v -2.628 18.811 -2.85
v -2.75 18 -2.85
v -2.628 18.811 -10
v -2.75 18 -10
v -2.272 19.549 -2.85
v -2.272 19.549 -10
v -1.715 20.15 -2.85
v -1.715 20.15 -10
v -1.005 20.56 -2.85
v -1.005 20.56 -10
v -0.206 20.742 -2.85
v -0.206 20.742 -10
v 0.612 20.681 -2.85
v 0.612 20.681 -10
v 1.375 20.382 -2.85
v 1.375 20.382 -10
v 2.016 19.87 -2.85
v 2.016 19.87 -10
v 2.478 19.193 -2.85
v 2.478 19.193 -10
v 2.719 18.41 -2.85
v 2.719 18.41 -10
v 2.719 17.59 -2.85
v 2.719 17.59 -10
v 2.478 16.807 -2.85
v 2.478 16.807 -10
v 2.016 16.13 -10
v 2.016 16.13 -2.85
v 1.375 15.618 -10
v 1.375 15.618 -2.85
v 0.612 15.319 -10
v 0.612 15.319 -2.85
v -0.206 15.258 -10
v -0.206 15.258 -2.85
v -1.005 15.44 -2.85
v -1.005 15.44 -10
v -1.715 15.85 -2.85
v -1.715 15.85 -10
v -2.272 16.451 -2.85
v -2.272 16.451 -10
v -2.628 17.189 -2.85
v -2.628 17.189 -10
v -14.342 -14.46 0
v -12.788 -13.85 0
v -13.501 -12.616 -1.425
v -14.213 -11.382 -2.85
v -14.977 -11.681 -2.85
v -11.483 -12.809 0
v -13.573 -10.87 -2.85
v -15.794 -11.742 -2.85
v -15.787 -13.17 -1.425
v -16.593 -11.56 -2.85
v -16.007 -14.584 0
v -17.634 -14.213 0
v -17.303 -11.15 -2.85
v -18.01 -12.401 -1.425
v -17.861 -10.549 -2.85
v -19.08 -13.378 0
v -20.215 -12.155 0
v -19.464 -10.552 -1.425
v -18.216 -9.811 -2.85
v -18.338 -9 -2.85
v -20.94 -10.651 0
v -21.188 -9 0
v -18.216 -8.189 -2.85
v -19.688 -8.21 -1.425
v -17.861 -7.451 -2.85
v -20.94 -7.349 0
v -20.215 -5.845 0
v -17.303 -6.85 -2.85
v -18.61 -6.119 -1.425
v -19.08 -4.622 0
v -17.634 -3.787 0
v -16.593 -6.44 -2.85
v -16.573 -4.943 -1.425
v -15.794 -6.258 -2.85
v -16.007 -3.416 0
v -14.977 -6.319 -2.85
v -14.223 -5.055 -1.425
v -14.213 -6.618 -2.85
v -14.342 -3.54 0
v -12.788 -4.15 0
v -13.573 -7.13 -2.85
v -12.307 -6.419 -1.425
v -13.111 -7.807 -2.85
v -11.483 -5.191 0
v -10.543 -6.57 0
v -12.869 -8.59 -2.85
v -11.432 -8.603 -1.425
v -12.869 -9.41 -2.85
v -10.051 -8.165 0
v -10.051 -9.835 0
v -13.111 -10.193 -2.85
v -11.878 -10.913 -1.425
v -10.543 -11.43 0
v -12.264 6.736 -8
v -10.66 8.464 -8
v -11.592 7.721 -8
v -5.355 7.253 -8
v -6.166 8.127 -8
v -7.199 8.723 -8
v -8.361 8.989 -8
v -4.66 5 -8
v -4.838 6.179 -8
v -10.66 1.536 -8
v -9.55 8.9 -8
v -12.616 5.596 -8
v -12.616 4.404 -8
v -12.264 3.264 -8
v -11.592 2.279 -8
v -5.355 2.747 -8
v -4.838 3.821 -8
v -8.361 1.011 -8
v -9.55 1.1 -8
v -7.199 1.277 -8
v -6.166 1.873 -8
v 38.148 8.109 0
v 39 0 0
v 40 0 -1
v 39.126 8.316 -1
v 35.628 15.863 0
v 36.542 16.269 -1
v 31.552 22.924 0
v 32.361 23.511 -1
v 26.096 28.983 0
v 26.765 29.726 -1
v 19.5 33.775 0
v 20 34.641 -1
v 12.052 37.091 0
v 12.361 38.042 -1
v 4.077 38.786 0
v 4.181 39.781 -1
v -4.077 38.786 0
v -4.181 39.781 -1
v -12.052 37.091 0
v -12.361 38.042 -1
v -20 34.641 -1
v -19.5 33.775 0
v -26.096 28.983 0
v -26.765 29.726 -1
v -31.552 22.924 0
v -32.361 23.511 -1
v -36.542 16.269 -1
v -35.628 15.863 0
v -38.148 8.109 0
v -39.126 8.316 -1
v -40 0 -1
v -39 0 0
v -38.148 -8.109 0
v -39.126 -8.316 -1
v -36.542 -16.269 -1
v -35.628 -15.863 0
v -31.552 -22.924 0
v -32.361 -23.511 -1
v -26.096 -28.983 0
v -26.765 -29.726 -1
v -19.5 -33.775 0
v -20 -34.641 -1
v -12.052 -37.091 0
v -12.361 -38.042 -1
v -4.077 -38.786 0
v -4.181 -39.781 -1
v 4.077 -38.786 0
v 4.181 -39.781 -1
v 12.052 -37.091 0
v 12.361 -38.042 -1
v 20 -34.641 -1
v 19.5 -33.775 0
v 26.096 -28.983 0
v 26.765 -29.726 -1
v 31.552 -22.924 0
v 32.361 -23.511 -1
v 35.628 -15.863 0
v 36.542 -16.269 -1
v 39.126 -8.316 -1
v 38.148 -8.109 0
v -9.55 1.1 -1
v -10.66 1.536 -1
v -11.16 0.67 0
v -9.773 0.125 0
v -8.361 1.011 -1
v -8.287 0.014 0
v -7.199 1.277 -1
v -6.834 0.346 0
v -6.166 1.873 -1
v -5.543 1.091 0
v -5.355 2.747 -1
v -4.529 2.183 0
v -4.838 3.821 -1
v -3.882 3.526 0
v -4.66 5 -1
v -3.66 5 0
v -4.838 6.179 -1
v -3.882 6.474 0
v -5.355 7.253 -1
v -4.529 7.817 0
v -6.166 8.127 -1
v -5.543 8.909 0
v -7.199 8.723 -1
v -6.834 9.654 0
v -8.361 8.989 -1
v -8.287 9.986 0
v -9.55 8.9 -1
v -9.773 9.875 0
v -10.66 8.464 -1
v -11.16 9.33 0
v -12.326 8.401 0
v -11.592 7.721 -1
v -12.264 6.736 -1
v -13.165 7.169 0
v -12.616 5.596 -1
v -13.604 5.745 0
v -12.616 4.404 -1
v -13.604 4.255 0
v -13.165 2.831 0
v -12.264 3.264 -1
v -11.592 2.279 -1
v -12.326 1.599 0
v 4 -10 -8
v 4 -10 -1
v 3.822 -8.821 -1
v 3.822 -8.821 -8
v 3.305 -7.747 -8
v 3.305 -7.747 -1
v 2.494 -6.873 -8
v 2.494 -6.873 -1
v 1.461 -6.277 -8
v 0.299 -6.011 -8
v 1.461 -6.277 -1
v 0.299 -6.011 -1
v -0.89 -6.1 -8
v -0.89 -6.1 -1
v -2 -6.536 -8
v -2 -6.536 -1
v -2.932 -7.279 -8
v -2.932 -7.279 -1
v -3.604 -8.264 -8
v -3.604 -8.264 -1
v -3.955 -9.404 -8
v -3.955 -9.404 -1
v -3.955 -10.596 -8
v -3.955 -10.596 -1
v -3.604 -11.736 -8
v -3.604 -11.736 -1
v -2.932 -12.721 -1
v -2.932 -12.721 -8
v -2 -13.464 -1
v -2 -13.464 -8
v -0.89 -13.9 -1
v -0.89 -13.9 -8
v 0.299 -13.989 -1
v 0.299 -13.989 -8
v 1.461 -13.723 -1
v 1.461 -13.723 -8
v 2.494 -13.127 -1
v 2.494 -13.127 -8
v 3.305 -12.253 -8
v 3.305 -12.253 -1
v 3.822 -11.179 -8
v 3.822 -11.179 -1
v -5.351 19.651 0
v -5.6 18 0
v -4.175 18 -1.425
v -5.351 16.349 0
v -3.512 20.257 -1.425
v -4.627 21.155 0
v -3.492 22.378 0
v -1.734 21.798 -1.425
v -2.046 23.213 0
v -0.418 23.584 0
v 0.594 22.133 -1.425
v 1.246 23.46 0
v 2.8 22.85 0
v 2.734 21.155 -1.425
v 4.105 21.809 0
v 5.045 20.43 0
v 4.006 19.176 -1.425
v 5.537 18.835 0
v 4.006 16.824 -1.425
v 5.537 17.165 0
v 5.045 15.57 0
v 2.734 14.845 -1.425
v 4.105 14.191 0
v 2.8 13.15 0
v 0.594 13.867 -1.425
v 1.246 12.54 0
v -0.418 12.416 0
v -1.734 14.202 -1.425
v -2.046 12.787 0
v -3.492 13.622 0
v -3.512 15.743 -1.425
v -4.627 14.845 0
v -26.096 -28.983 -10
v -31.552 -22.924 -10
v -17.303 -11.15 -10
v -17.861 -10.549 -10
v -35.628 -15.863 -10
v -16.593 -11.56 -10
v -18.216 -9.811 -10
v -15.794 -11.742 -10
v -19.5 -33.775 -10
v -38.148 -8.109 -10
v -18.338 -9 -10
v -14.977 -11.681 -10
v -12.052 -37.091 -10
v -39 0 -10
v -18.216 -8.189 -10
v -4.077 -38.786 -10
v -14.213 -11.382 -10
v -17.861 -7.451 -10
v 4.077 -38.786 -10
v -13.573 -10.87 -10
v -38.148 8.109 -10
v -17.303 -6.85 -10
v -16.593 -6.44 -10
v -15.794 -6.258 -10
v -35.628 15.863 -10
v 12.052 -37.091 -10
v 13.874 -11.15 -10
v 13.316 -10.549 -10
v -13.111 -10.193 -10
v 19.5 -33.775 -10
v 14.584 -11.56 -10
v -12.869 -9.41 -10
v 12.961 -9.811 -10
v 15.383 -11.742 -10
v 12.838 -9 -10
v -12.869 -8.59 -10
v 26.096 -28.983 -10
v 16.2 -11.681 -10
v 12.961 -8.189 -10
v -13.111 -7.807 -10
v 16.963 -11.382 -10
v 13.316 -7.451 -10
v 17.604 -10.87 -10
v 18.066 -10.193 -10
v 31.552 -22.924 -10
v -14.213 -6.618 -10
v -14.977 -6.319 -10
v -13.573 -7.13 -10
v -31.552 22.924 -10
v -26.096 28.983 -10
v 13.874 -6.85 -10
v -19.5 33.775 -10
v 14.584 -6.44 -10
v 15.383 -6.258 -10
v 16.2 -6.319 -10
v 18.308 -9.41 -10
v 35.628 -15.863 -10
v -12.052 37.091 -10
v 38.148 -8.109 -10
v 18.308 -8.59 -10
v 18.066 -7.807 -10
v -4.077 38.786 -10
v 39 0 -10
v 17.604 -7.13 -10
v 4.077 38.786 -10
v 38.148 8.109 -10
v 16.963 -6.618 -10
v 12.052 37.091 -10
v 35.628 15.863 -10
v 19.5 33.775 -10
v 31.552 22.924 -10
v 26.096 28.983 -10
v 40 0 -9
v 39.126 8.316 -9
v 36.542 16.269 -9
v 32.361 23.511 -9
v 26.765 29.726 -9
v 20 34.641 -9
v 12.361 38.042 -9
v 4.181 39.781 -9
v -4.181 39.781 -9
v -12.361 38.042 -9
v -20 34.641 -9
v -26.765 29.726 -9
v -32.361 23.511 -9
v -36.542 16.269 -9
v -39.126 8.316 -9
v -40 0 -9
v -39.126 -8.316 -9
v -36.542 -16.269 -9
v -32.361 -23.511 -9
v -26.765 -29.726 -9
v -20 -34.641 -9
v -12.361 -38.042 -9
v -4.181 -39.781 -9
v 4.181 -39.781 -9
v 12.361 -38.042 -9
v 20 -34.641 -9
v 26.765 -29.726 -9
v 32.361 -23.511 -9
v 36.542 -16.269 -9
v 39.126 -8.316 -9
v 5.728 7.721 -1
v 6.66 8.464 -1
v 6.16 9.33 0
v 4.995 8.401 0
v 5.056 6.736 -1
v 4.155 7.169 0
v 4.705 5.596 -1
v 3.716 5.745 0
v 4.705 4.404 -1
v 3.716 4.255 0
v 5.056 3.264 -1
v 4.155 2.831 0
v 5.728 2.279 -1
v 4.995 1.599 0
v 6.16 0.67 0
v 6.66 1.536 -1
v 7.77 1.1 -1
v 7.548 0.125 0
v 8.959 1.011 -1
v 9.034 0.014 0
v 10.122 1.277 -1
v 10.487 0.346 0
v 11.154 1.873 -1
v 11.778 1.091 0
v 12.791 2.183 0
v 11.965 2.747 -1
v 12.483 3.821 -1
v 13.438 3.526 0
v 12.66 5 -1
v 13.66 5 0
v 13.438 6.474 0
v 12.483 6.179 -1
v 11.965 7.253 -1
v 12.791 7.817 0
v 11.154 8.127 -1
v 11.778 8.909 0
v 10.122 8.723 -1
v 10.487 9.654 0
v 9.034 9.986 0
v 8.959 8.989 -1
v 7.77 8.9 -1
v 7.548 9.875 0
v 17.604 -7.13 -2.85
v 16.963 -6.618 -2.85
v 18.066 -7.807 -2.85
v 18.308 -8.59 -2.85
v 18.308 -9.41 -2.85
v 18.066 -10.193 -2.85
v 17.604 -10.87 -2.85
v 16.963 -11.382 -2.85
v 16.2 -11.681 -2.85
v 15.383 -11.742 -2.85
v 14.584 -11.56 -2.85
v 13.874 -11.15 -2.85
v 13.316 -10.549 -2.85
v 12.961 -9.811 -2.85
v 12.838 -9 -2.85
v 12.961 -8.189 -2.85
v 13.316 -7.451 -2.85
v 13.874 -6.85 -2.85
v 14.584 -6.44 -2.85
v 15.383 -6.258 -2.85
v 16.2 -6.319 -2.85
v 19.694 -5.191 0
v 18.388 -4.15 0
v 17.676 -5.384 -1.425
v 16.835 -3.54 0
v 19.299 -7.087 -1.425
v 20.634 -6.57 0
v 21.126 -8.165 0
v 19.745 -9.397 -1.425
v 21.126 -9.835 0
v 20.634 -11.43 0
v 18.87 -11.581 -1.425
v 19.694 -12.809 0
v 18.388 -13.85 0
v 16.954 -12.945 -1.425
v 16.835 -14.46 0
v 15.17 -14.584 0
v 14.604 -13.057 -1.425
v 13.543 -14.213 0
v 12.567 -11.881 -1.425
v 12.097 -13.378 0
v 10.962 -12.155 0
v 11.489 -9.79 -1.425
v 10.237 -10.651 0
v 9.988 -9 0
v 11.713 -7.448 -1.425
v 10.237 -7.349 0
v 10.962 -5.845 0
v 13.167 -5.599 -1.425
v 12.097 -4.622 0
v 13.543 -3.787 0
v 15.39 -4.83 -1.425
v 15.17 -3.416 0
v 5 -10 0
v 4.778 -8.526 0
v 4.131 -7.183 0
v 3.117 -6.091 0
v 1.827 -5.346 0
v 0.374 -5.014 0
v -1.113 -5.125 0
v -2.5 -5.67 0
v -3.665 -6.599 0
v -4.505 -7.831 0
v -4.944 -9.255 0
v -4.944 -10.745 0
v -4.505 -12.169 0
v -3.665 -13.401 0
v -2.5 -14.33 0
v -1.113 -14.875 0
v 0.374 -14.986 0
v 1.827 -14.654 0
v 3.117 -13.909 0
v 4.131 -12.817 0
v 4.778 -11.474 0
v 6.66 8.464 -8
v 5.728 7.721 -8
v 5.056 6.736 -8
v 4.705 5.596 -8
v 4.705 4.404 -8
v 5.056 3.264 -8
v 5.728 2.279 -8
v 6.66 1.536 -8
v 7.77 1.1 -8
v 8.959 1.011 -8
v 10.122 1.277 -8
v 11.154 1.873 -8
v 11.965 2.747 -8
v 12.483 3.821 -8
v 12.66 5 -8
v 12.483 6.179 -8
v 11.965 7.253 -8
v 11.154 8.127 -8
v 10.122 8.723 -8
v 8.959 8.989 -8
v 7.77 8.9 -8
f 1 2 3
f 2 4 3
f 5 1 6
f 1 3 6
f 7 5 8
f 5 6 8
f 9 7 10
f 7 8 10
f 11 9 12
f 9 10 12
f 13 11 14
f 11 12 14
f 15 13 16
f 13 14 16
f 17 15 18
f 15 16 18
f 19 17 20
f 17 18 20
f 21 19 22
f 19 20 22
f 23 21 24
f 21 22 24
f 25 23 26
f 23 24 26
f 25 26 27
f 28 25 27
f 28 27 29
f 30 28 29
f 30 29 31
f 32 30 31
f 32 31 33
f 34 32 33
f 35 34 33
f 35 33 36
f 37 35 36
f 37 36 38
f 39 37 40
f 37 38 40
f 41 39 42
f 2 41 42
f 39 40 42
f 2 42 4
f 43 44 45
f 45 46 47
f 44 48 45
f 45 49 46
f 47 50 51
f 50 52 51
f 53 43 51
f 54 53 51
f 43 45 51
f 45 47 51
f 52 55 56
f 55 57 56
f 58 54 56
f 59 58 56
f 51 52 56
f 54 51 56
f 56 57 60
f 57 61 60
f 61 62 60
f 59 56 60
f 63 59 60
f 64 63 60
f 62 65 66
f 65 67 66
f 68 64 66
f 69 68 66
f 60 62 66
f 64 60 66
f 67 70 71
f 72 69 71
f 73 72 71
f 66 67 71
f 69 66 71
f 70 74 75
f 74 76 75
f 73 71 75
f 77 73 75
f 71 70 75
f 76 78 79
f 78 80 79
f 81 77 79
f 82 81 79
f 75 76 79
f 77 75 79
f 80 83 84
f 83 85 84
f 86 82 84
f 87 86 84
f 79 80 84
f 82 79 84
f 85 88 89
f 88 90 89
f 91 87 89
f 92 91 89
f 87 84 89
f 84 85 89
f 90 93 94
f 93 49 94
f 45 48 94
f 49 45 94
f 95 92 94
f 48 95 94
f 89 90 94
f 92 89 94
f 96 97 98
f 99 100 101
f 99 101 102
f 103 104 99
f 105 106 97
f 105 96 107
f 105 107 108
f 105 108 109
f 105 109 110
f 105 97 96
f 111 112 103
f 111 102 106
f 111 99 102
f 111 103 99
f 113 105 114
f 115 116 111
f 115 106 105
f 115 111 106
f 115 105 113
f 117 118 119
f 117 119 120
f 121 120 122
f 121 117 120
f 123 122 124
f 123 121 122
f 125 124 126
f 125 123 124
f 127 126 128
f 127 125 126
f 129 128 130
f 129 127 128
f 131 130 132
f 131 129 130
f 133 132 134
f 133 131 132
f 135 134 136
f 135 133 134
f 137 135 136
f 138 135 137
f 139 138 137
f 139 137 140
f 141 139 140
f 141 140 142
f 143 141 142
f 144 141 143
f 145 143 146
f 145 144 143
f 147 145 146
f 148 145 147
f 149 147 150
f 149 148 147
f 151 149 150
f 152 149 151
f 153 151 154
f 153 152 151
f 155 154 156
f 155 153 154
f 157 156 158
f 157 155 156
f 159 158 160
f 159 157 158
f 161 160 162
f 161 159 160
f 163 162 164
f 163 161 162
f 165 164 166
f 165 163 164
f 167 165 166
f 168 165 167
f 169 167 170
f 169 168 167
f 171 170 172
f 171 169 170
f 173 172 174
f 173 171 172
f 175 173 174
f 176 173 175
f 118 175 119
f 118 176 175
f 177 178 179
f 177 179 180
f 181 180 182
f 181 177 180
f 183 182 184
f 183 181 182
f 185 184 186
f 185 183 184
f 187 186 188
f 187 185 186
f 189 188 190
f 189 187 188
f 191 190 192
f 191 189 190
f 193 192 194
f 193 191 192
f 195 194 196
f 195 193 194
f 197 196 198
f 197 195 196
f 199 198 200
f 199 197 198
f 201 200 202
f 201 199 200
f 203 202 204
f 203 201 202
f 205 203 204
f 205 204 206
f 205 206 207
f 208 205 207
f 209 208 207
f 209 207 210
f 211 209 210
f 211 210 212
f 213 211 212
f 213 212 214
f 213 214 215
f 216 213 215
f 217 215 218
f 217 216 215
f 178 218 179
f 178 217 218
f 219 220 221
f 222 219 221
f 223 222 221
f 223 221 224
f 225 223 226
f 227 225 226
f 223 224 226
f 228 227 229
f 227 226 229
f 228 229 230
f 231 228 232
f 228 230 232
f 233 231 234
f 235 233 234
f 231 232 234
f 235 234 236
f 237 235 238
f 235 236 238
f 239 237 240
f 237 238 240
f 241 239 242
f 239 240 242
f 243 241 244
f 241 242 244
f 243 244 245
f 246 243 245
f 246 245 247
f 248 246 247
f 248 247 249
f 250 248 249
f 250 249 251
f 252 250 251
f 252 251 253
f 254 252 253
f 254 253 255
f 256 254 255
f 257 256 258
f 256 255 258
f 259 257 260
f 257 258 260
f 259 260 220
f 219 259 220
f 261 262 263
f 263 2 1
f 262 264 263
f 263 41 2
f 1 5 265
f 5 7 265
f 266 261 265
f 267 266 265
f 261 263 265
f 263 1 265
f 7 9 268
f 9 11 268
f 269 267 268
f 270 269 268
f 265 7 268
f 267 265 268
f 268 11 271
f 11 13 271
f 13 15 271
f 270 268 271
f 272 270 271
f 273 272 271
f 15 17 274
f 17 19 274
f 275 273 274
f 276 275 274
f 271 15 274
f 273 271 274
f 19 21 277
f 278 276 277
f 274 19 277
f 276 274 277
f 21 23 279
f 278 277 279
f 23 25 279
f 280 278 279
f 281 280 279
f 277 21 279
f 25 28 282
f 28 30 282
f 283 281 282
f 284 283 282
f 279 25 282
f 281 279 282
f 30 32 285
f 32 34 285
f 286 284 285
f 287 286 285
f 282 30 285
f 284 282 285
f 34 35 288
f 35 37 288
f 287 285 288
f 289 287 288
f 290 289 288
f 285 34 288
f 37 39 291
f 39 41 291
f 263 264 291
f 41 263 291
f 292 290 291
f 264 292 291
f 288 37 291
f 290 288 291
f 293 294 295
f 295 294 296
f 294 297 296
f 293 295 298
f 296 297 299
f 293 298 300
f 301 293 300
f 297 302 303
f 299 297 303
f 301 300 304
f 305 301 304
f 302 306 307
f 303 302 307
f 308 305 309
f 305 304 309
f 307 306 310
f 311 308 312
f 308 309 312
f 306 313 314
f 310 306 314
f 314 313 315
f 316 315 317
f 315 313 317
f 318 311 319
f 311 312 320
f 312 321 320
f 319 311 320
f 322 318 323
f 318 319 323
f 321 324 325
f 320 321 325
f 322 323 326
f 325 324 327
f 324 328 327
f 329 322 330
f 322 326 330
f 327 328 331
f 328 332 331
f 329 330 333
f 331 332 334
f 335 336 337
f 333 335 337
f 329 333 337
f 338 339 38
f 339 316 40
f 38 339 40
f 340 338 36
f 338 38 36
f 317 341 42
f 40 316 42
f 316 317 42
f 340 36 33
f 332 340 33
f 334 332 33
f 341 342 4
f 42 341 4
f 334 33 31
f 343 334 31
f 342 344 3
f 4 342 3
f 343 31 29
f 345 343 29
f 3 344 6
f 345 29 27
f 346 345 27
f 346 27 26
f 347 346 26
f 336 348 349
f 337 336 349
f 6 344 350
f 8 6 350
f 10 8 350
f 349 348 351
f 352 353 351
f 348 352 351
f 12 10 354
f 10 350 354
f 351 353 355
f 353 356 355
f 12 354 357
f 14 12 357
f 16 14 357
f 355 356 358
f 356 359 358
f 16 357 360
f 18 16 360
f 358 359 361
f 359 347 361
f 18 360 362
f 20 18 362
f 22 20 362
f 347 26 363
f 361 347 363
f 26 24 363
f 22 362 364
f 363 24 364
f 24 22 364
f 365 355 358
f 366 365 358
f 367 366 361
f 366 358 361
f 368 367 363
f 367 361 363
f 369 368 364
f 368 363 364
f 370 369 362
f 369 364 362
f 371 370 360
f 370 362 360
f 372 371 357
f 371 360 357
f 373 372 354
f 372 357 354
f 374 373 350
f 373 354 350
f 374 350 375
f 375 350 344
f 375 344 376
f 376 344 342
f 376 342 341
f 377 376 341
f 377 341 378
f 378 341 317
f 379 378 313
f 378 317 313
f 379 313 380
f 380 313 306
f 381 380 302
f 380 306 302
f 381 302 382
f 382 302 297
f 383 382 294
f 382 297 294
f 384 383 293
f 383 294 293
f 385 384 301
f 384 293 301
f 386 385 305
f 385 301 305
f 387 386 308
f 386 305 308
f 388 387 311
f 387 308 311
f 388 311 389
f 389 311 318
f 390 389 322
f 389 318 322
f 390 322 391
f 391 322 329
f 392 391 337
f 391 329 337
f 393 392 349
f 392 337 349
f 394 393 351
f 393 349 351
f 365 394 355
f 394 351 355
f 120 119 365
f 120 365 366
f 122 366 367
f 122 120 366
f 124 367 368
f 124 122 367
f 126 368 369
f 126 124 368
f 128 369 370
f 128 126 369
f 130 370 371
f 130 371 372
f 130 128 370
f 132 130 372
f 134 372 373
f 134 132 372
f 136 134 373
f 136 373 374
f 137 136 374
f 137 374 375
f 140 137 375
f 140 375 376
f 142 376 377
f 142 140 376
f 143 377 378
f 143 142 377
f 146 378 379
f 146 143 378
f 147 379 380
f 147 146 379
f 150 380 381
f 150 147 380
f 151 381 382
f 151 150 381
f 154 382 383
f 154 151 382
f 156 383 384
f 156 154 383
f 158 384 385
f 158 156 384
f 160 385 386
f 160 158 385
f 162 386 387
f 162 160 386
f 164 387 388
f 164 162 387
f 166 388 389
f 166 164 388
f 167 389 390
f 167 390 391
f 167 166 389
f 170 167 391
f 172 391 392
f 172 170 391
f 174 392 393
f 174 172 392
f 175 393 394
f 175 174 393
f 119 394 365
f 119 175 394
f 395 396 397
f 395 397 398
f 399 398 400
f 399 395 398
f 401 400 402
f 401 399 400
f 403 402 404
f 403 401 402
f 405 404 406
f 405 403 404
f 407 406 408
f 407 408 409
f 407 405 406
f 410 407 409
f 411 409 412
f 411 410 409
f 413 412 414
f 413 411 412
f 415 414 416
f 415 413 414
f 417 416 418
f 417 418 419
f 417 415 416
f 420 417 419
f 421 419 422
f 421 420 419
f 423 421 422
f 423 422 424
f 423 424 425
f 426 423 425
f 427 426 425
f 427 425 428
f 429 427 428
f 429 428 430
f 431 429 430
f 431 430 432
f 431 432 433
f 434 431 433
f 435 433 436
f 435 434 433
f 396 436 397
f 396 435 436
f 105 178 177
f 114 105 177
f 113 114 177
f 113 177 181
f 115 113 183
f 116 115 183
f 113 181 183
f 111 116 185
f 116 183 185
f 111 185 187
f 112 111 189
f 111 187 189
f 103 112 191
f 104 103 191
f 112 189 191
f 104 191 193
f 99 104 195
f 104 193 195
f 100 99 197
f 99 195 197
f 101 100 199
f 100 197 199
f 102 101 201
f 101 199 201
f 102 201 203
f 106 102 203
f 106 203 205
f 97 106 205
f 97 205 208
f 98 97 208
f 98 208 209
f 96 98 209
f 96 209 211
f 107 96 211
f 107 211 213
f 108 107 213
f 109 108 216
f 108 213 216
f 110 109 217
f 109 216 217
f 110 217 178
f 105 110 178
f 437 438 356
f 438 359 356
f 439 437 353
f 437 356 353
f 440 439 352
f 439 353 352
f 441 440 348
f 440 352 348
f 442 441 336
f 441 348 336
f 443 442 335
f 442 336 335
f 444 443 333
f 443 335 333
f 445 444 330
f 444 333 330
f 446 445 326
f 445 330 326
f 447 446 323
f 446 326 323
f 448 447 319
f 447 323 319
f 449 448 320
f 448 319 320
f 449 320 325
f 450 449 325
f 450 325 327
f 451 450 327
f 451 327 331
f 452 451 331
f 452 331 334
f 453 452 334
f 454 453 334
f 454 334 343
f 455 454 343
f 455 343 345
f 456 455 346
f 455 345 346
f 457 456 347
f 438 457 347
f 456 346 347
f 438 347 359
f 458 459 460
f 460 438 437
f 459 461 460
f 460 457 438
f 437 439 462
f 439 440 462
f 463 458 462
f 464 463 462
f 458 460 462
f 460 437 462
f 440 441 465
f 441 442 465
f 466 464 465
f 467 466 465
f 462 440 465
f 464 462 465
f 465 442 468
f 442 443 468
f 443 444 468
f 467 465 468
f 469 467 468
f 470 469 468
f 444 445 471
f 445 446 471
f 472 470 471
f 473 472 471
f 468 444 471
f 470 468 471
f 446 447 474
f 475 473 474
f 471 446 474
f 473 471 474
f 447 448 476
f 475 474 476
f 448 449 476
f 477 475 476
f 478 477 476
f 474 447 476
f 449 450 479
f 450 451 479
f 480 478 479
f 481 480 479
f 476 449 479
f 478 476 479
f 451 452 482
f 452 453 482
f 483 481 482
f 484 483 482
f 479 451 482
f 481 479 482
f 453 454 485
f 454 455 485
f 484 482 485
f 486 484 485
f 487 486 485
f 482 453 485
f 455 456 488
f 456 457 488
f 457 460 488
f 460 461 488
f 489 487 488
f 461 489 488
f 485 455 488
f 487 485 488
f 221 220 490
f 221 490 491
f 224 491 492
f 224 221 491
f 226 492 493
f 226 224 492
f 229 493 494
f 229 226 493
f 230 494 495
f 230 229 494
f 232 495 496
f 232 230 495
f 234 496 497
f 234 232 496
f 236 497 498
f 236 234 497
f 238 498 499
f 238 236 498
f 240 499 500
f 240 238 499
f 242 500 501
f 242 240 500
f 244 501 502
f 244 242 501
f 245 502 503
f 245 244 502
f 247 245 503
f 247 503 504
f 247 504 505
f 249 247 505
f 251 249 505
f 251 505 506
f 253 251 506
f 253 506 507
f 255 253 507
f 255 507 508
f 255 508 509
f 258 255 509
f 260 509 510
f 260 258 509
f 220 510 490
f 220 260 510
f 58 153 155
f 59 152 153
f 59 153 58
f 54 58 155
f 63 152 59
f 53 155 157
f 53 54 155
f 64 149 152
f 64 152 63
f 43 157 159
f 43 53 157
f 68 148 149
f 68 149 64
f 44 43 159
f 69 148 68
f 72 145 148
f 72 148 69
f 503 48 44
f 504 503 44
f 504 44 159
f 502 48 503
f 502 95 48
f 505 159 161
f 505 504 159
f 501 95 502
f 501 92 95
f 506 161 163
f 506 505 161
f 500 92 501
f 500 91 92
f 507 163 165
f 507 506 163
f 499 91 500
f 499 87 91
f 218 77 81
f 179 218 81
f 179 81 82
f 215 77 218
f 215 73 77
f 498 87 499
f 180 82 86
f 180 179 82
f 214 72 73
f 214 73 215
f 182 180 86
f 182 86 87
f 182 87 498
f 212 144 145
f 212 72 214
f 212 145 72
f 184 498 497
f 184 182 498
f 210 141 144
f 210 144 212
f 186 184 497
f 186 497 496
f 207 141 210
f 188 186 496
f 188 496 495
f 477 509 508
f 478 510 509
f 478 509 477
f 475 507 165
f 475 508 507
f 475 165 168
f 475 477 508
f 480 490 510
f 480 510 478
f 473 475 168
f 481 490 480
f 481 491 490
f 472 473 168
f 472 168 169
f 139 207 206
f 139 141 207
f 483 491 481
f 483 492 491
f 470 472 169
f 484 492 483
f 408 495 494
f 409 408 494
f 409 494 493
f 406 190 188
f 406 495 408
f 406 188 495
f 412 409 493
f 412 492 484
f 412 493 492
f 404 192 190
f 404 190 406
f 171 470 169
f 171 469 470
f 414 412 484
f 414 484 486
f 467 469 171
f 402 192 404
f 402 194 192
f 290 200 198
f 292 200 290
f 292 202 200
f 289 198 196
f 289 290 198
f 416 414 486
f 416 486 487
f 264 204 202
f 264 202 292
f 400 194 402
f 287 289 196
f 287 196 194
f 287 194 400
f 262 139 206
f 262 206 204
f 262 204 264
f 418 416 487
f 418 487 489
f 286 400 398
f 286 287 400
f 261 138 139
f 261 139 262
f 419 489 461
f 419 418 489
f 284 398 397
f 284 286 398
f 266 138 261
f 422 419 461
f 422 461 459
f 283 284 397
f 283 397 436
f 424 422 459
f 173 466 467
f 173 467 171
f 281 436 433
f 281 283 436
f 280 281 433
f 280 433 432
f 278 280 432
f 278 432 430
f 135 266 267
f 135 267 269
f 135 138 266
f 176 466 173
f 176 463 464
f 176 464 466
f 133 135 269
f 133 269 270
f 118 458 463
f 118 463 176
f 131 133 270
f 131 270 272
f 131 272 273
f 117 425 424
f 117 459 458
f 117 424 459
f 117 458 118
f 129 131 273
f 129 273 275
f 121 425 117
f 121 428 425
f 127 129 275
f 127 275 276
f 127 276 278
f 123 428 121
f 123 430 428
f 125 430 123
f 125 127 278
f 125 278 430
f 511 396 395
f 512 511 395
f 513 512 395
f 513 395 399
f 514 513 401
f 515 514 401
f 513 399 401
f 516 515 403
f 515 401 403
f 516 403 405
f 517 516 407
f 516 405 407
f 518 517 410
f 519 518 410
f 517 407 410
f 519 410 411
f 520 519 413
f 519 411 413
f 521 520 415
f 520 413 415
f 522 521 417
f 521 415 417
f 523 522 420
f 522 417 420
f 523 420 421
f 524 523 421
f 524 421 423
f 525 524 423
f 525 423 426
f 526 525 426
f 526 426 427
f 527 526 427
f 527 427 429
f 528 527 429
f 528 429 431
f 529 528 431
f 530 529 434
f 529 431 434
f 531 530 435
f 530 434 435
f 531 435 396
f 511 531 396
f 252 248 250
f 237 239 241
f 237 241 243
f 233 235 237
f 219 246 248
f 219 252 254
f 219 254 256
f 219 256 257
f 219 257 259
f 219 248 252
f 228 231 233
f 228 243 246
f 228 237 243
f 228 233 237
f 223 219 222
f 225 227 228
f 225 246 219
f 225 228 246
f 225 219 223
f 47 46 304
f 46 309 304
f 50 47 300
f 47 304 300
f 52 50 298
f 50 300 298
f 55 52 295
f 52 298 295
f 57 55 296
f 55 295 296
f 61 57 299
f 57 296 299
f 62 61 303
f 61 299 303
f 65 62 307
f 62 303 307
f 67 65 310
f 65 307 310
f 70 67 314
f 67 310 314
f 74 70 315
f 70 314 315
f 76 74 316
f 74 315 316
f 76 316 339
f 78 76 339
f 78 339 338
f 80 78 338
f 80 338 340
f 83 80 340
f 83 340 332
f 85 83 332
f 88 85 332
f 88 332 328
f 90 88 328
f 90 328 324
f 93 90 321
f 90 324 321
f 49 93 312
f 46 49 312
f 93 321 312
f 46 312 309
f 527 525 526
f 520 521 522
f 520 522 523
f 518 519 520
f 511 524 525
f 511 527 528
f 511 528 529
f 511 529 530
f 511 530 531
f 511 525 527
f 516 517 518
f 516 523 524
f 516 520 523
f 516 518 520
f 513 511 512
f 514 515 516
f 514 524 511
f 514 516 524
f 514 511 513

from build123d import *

# Parameters (mm, degrees)
F0_R            = 40
F2_DEPTH        = 10
F3_D            = 5.5
F3_CSINK_D      = 11.2
F3_CSINK_ANGLE  = 90
F3_COPIES_COUNT = 3
F4_R            = 4
F5_DEPTH        = 8
F5_COPIES_COUNT = 3
F6_SIZE         = 1


# Not quite as in the source:
# - a pattern or mirror of a feature is missing from the dataset's text; its kind, count and spacing are read off the source's solid
# - a feature names something its author has since deleted; it is built from what else it names


with BuildPart() as f2:
    # F0 (on Top) → F2 (new body)
    with BuildSketch(Plane.XY):
        Circle(F0_R)
    extrude(amount=-F2_DEPTH)

    # F3 (through all)
    with Locations(Plane.XY):
        with Locations((0, 18)):
            f3 = CounterSinkHole(F3_D / 2, F3_CSINK_D / 2, counter_sink_angle=F3_CSINK_ANGLE)

    # F3_copies: F3 ×3 about axis
    f3_copies_axis = Axis((0, 0, 0), (0, 0, 1))
    for i in range(1, F3_COPIES_COUNT):
        add(f3.rotate(f3_copies_axis, i * 360 / F3_COPIES_COUNT), mode=Mode.SUBTRACT)

    # F4 (on face) → F5 (cut)
    with BuildSketch(Plane.XY):
        with Locations((0, -10)):
            Circle(F4_R)
    f5 = extrude(amount=-F5_DEPTH, mode=Mode.SUBTRACT)

    # F5_copies: F5 ×3 about axis
    f5_copies_axis = Axis((0, 0, 0), (0, 0, 1))
    for i in range(1, F5_COPIES_COUNT):
        add(f5.rotate(f5_copies_axis, i * 360 / F5_COPIES_COUNT), mode=Mode.SUBTRACT)

    # F6
    f6_edges = [f2.edges().sort_by_distance(p)[0] for p in [
        (-40, 0, -10),
        (-40, 0, 0),
        (-4, -10, 0),
        (-6.660254, 8.464102, 0),
        (10.660254, 1.535898, 0),
    ]]
    chamfer(f6_edges, length=F6_SIZE)


solid = f2.part
